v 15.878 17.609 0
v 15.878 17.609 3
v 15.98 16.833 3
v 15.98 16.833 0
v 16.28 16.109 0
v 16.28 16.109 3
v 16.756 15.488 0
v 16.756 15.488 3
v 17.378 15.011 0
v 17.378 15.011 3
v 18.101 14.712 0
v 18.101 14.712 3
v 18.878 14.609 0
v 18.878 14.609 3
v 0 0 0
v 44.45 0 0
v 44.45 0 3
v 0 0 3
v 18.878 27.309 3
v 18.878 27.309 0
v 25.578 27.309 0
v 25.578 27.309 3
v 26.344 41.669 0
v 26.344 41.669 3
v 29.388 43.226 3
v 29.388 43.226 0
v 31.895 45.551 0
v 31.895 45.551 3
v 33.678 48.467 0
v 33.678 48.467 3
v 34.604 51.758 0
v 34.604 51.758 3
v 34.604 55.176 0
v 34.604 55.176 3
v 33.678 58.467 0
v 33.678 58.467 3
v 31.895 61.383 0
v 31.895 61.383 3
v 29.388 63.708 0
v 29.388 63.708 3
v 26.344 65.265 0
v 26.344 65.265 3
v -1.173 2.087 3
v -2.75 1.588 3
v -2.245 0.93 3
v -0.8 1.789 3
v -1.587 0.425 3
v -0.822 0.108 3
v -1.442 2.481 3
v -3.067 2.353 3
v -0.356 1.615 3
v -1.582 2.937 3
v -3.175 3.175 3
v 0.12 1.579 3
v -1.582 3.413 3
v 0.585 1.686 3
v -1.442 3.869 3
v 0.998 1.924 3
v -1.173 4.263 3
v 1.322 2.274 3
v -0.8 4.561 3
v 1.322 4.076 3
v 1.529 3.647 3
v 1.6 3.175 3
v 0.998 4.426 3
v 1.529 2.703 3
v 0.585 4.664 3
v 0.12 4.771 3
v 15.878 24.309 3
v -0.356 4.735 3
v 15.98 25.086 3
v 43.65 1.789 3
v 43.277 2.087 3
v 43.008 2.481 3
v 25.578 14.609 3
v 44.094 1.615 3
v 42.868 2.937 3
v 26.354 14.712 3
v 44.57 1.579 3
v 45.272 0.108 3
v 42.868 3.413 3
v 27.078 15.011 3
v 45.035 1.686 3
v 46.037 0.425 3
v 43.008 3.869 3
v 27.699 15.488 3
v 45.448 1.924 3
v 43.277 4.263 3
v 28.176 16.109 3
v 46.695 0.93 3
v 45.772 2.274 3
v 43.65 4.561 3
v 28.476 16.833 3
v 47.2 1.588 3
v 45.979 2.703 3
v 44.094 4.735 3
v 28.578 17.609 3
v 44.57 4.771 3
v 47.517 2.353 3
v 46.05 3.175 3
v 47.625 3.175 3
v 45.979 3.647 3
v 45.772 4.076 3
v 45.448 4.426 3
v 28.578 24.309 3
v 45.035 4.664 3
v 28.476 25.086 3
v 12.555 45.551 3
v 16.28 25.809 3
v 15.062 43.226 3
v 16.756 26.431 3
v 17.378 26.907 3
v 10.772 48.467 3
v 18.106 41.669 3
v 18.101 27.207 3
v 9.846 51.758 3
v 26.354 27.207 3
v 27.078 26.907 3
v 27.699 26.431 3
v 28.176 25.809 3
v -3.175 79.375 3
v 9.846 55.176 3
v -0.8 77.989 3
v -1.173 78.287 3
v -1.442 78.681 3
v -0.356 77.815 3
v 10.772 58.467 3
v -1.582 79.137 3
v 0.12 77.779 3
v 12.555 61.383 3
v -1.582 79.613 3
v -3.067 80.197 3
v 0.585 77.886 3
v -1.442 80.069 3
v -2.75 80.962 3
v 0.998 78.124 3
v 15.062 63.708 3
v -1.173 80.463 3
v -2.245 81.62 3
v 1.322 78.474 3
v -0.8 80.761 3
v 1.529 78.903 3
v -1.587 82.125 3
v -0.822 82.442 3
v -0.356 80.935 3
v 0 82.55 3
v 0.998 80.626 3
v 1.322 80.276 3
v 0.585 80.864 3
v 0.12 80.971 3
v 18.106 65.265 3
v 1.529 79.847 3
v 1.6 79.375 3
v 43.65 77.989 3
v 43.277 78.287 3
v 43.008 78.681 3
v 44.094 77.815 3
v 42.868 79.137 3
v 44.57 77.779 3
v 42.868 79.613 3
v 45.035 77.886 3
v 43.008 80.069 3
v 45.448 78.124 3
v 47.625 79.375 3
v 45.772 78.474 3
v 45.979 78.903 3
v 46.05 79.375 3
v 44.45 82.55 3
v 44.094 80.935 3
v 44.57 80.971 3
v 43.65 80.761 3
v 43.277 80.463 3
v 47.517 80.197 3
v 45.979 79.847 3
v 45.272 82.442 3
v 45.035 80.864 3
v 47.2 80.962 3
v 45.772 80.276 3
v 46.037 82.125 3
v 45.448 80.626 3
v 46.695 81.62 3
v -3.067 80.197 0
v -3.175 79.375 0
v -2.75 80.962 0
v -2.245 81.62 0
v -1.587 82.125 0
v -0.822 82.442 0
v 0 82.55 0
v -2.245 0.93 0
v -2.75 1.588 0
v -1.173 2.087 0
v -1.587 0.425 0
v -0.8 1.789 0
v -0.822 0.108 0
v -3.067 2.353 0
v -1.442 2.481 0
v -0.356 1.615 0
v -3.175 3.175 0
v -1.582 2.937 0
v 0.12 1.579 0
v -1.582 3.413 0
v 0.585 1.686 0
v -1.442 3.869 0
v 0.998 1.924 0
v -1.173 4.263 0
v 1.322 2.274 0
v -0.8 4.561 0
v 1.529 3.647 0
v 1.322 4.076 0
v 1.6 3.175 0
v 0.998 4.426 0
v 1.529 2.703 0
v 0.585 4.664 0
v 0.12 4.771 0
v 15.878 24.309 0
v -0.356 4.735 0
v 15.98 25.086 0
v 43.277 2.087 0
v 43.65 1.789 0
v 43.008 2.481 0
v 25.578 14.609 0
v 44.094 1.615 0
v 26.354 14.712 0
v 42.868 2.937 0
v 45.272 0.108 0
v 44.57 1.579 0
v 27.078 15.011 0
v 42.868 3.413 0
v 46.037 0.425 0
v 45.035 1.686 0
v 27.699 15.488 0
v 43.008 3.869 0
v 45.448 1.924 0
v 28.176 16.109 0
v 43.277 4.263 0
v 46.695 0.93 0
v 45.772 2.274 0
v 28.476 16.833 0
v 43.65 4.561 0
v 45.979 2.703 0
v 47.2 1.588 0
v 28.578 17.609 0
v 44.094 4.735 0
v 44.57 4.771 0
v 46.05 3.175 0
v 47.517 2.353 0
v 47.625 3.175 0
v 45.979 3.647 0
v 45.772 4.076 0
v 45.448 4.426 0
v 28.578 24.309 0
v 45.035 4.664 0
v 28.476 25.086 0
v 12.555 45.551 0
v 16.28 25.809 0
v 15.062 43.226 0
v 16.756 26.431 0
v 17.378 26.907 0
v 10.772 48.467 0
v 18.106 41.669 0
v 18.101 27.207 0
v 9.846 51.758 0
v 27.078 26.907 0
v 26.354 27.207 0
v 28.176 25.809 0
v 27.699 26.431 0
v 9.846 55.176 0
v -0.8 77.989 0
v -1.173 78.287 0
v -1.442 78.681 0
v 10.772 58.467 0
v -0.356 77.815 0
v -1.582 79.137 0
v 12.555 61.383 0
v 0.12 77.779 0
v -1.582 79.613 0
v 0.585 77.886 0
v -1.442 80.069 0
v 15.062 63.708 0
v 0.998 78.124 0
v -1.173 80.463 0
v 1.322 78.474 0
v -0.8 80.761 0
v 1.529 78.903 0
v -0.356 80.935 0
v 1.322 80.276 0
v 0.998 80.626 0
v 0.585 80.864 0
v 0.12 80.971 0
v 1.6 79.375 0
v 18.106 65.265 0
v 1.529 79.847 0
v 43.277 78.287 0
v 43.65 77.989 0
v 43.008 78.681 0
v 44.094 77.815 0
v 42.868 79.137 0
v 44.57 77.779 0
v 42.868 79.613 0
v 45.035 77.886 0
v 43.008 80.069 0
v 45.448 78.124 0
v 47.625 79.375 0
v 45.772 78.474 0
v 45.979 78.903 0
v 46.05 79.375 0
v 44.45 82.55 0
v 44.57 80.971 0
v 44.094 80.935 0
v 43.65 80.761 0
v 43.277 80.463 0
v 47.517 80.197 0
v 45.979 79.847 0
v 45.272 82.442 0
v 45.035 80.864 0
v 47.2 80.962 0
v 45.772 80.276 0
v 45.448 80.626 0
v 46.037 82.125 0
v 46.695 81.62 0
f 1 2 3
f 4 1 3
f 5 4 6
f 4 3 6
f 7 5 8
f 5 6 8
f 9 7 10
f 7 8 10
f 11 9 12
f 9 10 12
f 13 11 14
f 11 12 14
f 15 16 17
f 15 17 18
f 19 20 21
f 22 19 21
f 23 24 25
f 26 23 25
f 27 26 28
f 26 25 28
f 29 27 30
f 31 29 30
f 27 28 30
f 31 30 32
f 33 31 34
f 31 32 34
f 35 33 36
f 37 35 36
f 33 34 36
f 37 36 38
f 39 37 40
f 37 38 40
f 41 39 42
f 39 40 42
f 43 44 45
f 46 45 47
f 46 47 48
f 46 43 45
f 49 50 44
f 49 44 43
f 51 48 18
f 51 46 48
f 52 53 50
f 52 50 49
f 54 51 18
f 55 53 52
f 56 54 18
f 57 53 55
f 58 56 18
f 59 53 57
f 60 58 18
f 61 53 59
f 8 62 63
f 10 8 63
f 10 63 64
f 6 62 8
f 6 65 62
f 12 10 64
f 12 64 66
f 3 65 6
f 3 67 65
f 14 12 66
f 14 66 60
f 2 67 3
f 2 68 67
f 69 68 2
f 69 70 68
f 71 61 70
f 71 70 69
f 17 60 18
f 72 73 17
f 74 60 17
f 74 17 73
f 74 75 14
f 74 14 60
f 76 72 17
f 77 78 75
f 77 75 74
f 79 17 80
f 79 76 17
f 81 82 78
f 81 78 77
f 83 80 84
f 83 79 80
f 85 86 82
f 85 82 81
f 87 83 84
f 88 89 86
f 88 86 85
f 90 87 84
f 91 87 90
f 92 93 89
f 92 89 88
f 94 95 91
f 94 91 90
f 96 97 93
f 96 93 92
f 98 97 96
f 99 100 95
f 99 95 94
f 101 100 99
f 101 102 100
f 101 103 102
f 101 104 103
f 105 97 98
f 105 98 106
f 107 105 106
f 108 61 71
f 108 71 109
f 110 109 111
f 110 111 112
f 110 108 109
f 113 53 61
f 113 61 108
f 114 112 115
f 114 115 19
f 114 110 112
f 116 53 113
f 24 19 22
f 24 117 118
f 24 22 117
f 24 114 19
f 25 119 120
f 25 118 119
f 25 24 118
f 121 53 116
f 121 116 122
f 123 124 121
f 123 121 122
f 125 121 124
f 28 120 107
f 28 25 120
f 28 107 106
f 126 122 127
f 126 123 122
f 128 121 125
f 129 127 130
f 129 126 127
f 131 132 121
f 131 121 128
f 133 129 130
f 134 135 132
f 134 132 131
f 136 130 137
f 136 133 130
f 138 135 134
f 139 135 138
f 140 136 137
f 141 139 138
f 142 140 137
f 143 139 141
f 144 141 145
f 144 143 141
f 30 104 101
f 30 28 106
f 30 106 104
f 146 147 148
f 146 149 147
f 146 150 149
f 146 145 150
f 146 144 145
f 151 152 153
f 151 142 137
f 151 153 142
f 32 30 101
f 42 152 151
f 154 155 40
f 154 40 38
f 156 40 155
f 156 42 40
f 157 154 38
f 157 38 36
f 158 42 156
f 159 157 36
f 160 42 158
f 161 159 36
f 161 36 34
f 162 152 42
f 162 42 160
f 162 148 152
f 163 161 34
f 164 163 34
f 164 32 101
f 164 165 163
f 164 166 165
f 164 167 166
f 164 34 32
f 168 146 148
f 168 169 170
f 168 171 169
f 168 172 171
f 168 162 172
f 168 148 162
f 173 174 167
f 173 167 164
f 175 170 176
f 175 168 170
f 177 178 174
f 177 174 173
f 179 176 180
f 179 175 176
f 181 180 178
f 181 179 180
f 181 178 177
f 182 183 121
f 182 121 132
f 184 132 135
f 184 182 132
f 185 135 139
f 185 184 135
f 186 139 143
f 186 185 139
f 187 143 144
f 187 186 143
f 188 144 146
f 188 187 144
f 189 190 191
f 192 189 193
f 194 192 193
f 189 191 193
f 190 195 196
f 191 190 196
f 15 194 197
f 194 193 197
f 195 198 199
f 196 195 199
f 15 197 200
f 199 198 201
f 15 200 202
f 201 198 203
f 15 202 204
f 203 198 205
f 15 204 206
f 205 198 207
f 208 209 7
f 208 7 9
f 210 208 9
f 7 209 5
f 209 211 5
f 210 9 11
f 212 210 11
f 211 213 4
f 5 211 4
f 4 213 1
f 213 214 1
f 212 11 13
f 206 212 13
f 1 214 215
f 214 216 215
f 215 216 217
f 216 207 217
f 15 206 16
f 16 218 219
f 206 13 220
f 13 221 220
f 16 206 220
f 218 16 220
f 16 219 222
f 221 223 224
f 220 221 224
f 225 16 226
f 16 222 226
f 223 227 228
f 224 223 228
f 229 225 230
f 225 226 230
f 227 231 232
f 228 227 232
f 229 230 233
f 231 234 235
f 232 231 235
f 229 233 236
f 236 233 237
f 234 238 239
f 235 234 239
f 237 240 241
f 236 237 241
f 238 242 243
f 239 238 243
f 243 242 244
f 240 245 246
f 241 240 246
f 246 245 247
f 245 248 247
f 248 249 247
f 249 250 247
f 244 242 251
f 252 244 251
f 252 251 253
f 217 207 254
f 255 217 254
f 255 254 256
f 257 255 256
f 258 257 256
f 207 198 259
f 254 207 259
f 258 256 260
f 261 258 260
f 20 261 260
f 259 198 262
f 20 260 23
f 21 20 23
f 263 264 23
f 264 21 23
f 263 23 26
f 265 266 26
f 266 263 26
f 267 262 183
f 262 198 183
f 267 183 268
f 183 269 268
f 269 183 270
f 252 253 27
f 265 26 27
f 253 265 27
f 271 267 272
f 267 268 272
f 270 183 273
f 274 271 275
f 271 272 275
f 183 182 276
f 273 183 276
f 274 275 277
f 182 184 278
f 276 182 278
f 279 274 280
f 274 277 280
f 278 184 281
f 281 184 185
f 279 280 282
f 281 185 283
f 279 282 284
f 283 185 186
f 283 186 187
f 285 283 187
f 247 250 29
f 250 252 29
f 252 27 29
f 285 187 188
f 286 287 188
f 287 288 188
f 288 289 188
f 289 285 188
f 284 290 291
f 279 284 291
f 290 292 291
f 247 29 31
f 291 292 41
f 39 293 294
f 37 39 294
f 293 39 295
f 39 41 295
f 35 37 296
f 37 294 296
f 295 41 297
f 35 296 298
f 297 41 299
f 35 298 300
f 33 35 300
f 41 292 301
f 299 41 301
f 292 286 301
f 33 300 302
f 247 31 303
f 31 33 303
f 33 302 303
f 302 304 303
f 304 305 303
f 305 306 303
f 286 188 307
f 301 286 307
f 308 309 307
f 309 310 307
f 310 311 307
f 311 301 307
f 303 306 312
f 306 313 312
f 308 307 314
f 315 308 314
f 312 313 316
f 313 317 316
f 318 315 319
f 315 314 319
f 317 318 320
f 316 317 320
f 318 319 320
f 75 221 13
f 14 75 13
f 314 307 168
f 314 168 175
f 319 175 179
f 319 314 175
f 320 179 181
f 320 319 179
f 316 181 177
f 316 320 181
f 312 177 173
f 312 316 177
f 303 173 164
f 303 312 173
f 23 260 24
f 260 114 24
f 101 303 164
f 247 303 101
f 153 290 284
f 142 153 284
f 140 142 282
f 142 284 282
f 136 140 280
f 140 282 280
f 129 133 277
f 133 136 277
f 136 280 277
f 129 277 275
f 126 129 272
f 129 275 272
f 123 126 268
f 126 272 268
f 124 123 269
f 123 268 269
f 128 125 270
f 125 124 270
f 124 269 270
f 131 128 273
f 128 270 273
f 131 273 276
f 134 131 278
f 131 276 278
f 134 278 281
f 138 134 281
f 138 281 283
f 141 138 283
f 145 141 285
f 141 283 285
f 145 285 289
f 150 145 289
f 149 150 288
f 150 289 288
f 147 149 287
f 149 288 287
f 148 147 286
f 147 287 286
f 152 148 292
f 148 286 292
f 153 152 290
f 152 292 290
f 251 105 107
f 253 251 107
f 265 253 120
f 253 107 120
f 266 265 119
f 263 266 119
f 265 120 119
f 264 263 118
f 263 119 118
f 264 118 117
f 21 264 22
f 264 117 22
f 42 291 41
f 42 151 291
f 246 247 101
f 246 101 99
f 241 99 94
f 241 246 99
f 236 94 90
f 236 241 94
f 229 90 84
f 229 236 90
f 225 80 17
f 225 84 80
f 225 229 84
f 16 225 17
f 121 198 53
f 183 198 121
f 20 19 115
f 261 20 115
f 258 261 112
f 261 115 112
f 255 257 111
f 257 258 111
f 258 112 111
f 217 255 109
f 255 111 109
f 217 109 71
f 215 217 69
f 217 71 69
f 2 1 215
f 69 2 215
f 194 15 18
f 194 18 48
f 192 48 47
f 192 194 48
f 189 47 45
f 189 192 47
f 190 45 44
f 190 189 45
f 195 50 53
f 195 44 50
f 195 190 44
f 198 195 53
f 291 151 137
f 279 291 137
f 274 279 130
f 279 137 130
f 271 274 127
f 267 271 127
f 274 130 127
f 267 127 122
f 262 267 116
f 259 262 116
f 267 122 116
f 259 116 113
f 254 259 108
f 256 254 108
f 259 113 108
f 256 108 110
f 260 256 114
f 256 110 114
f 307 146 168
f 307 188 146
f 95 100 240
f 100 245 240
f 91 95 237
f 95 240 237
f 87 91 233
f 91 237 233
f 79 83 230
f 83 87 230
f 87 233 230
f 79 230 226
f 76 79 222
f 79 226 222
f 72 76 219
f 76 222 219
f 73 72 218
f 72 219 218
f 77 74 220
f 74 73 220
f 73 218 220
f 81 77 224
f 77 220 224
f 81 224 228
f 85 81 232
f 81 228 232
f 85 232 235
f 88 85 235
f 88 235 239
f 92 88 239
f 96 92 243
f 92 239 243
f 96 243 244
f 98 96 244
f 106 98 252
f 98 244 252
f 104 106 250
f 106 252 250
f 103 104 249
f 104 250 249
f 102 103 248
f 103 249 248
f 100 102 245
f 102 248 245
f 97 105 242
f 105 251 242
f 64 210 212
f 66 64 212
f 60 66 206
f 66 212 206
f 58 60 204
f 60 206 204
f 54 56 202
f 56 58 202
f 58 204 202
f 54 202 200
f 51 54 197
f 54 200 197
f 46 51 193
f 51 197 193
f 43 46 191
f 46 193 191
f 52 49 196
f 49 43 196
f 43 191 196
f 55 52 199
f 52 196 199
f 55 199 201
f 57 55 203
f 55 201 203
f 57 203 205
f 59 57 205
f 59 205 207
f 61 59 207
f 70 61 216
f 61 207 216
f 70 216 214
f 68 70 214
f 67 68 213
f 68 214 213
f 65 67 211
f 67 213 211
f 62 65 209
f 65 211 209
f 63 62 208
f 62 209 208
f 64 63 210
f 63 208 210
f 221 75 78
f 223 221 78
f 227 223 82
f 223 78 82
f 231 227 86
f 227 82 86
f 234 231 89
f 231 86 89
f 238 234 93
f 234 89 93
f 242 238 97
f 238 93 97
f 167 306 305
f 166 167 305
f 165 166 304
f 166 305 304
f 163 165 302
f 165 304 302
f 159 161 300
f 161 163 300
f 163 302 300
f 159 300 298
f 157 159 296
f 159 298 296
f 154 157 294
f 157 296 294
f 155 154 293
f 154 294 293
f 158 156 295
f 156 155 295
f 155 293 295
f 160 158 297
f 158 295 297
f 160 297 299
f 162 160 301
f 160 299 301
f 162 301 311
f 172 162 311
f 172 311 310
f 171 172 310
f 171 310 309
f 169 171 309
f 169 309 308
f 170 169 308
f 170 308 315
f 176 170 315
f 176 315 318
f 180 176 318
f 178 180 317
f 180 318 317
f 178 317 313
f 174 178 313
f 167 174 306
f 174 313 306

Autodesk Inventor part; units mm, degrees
ref_plane "YZ Plane" through (0, 0, 0) normal (1, 0, 0) x (0, 1, 0)
ref_plane "XZ Plane" through (0, 0, 0) normal (0, 1, 0) x (-1, 0, 0)
ref_plane "XY Plane" through (0, 0, 0) normal (0, 0, 1) x (1, 0, 0)
sketch "Sketch1" plane through (0, 0, 0) normal (0, 0, 1) x (1, 0, 0)
  arc A0 (-3.175, 3.175) -> (0, 0) centre (0.0002, 3.1752) ccw projected
  line L0 (44.45, 0) -> (0, 0) projected
  arc A1 (44.45, 0) -> (47.625, 3.175) centre (44.4498, 3.1752) ccw projected
  line L1 (47.625, 79.375) -> (47.625, 3.175) projected
  arc A2 (47.625, 79.375) -> (44.45, 82.55) centre (44.4498, 79.3748) ccw projected
  line L2 (0, 82.55) -> (44.45, 82.55) projected
  arc A3 (0, 82.55) -> (-3.175, 79.375) centre (0.0002, 79.3748) ccw projected
  line L3 (-3.175, 3.175) -> (-3.175, 79.375) projected
  circle A4 centre (0, 3.175) radius 1.6 projected
  circle A5 centre (7.112, 4.191) radius 0.51 projected
  circle A6 centre (7.112, 9.271) radius 0.51 projected
  circle A7 centre (7.112, 6.731) radius 0.51 projected
  circle A8 centre (9.652, 6.731) radius 0.51 projected
  circle A9 centre (9.652, 4.191) radius 0.51 projected
  circle A10 centre (9.652, 9.271) radius 0.51 projected
  circle A11 centre (15.655, 10.499) radius 1.15 projected
  circle A12 centre (14.225, 36.449) radius 0.85 projected
  circle A13 centre (4.699, 60.198) radius 0.51 projected
  circle A14 centre (4.699, 57.658) radius 0.51 projected
  circle A15 centre (0, 79.375) radius 1.6 projected
  circle A16 centre (4.699, 62.738) radius 0.51 projected
  circle A17 centre (4.699, 65.278) radius 0.51 projected
  circle A18 centre (13.7, 69.341) radius 0.46 projected
  circle A19 centre (16.2, 69.341) radius 0.46 projected
  circle A20 centre (6.13, 72.051) radius 1.15 projected
  circle A21 centre (11.7, 69.341) radius 0.46 projected
  circle A22 centre (9.2, 69.341) radius 0.46 projected
  circle A23 centre (23.225, 13.209) radius 0.46 projected
  circle A24 centre (25.725, 13.209) radius 0.46 projected
  circle A25 centre (18.725, 13.209) radius 0.46 projected
  circle A26 centre (21.225, 13.209) radius 0.46 projected
  circle A27 centre (28.795, 10.499) radius 1.15 projected
  circle A28 centre (44.45, 3.175) radius 1.6 projected
  circle A29 centre (30.225, 36.449) radius 0.85 projected
  circle A30 centre (39.751, 57.531) radius 0.51 projected
  circle A31 centre (39.751, 60.071) radius 0.51 projected
  circle A32 centre (31.385, 69.341) radius 0.46 projected
  circle A33 centre (33.385, 69.341) radius 0.46 projected
  circle A34 centre (19.27, 72.051) radius 1.15 projected
  circle A35 centre (28.885, 69.341) radius 0.46 projected
  circle A36 centre (25.815, 72.051) radius 1.15 projected
  circle A37 centre (39.751, 65.151) radius 0.51 projected
  circle A38 centre (39.751, 62.611) radius 0.51 projected
  circle A39 centre (35.885, 69.341) radius 0.46 projected
  circle A40 centre (38.955, 72.051) radius 1.15 projected
  circle A41 centre (44.45, 79.375) radius 1.6 projected
  line L4 (19.2278, 19.1042) -> (19.2278, 22.8146) construction
  line L5 (20.234, 18.0978) -> (19.2662, 19.0663) construction
  line L6 (20.2568, 18.0747) -> (24.1988, 18.0747) construction
  line L7 (19.2662, 22.8525) -> (20.234, 23.821) construction
  line L8 (24.1988, 23.8441) -> (20.2568, 23.8441) construction
  line L9 (24.2216, 23.821) -> (25.1894, 22.8525) construction
  line L10 (25.2278, 22.8146) -> (25.2278, 19.1042) construction
  line L11 (25.1894, 19.0663) -> (24.2216, 18.0978) construction
  line L12 (19.2278, 23.8441) -> (25.2278, 23.8441) construction
  line L13 (25.2278, 23.8441) -> (25.2278, 18.0747) construction
  line L14 (25.2278, 18.0747) -> (19.2278, 18.0747) construction
  line L15 (19.2278, 18.0747) -> (19.2278, 23.8441) construction
  line L16 (19.2278, 20.9594) -> (25.2278, 20.9594) construction
  line L17 (22.2278, 23.8441) -> (22.2278, 18.0747) construction
  line L18 (15.8778, 27.3094) -> (28.5778, 27.3094)
  line L19 (28.5778, 27.3094) -> (28.5778, 14.6094)
  line L20 (28.5778, 14.6094) -> (15.8778, 14.6094)
  line L21 (15.8778, 14.6094) -> (15.8778, 27.3094)
  line L22 (15.8778, 27.3094) -> (28.5778, 14.6094) construction
  line L23 (28.5778, 27.3094) -> (15.8778, 14.6094) construction
  point P0 (22.2278, 20.9594)
  dimension "d0" = 12.7
  dimension "d1" = 12.7
extrude "Extrusion1" add sketch "Sketch1" along normal blind 3 contours L3 A3 L2 A2 L1 A1 L0 A0 | A5 | A6 | A7 | A8 | A9 | A10 | A11 | A12 | A13 | A14 | A16 | A17 | A18 | A19 | A20 | A21 | A22 | A23 | A24 | A25 | A26 | A27 | A29 | A30 | A31 | A32 | A33 | A34 | A35 | A36 | A37 | A38 | A39 | A40
fillet "Fillet1" radius 3 4 edges at (15.8778, 27.3094, 1.5) (28.5778, 27.3094, 1.5) (15.8778, 14.6094, 1.5) (28.5778, 14.6094, 1.5)
sketch "Sketch2" plane through (0, 0, 3) normal (0, 0, 1) x (1, 0, 0)
  line L0 (-3.175, 79.375) -> (-3.175, 3.175) construction
  arc A0 (-3.175, 3.175) -> (0, 0) centre (0.0002, 3.1752) ccw construction
  line L1 (0, 0) -> (44.45, 0) construction
  arc A1 (44.45, 0) -> (47.625, 3.175) centre (44.4498, 3.1752) ccw construction
  line L2 (47.625, 3.175) -> (47.625, 79.375) construction
  arc A2 (47.625, 79.375) -> (44.45, 82.55) centre (44.4498, 79.3748) ccw construction
  line L3 (44.45, 82.55) -> (0, 82.55) construction
  arc A3 (0, 82.55) -> (-3.175, 79.375) centre (0.0002, 79.3748) ccw construction
  line L4 (18.8778, 27.3094) -> (25.5778, 27.3094) construction
  arc A4 (28.5778, 24.3094) -> (25.5778, 27.3094) centre (25.5778, 24.3094) ccw construction
  line L5 (28.5778, 24.3094) -> (28.5778, 17.6094) construction
  arc A5 (25.5778, 14.6094) -> (28.5778, 17.6094) centre (25.5778, 17.6094) ccw construction
  line L6 (25.5778, 14.6094) -> (18.8778, 14.6094) construction
  arc A6 (15.8778, 17.6094) -> (18.8778, 14.6094) centre (18.8778, 17.6094) ccw construction
  line L7 (15.8778, 17.6094) -> (15.8778, 24.3094) construction
  arc A7 (18.8778, 27.3094) -> (15.8778, 24.3094) centre (18.8778, 24.3094) ccw construction
  circle A8 centre (44.45, 79.375) radius 1.6 construction
  circle A9 centre (44.45, 3.175) radius 1.6 construction
  circle A10 centre (0, 79.375) radius 1.6 construction
  circle A11 centre (0, 3.175) radius 1.6 construction
  circle A12 centre (22.225, 53.467) radius 12.4968
  line L8 (22.225, 82.55) -> (22.225, 0) construction
  line L9 (0, 0) -> (44.45, 0) construction
  line L10 (18.1055, 65.2653) -> (26.3445, 65.2653)
  line L11 (18.1055, 41.6687) -> (26.3445, 41.6687)
  line L12 (22.225, 65.9638) -> (22.225, 65.2653) construction
  line L13 (22.225, 41.6687) -> (22.225, 40.9702) construction
  dimension "d5" = 24.9936
  dimension "d6" = 53.467
  dimension "d7" = 23.5966
  dimension "d8" = 0.6985
  dimension "d9" = 0.6985
extrude "Extrusion2" cut sketch "Sketch2" against normal through all contours A12 L11 L10
equation "\"d1\" = d0"
equation "\"d9\" = d8"
properties part number "Cover"
